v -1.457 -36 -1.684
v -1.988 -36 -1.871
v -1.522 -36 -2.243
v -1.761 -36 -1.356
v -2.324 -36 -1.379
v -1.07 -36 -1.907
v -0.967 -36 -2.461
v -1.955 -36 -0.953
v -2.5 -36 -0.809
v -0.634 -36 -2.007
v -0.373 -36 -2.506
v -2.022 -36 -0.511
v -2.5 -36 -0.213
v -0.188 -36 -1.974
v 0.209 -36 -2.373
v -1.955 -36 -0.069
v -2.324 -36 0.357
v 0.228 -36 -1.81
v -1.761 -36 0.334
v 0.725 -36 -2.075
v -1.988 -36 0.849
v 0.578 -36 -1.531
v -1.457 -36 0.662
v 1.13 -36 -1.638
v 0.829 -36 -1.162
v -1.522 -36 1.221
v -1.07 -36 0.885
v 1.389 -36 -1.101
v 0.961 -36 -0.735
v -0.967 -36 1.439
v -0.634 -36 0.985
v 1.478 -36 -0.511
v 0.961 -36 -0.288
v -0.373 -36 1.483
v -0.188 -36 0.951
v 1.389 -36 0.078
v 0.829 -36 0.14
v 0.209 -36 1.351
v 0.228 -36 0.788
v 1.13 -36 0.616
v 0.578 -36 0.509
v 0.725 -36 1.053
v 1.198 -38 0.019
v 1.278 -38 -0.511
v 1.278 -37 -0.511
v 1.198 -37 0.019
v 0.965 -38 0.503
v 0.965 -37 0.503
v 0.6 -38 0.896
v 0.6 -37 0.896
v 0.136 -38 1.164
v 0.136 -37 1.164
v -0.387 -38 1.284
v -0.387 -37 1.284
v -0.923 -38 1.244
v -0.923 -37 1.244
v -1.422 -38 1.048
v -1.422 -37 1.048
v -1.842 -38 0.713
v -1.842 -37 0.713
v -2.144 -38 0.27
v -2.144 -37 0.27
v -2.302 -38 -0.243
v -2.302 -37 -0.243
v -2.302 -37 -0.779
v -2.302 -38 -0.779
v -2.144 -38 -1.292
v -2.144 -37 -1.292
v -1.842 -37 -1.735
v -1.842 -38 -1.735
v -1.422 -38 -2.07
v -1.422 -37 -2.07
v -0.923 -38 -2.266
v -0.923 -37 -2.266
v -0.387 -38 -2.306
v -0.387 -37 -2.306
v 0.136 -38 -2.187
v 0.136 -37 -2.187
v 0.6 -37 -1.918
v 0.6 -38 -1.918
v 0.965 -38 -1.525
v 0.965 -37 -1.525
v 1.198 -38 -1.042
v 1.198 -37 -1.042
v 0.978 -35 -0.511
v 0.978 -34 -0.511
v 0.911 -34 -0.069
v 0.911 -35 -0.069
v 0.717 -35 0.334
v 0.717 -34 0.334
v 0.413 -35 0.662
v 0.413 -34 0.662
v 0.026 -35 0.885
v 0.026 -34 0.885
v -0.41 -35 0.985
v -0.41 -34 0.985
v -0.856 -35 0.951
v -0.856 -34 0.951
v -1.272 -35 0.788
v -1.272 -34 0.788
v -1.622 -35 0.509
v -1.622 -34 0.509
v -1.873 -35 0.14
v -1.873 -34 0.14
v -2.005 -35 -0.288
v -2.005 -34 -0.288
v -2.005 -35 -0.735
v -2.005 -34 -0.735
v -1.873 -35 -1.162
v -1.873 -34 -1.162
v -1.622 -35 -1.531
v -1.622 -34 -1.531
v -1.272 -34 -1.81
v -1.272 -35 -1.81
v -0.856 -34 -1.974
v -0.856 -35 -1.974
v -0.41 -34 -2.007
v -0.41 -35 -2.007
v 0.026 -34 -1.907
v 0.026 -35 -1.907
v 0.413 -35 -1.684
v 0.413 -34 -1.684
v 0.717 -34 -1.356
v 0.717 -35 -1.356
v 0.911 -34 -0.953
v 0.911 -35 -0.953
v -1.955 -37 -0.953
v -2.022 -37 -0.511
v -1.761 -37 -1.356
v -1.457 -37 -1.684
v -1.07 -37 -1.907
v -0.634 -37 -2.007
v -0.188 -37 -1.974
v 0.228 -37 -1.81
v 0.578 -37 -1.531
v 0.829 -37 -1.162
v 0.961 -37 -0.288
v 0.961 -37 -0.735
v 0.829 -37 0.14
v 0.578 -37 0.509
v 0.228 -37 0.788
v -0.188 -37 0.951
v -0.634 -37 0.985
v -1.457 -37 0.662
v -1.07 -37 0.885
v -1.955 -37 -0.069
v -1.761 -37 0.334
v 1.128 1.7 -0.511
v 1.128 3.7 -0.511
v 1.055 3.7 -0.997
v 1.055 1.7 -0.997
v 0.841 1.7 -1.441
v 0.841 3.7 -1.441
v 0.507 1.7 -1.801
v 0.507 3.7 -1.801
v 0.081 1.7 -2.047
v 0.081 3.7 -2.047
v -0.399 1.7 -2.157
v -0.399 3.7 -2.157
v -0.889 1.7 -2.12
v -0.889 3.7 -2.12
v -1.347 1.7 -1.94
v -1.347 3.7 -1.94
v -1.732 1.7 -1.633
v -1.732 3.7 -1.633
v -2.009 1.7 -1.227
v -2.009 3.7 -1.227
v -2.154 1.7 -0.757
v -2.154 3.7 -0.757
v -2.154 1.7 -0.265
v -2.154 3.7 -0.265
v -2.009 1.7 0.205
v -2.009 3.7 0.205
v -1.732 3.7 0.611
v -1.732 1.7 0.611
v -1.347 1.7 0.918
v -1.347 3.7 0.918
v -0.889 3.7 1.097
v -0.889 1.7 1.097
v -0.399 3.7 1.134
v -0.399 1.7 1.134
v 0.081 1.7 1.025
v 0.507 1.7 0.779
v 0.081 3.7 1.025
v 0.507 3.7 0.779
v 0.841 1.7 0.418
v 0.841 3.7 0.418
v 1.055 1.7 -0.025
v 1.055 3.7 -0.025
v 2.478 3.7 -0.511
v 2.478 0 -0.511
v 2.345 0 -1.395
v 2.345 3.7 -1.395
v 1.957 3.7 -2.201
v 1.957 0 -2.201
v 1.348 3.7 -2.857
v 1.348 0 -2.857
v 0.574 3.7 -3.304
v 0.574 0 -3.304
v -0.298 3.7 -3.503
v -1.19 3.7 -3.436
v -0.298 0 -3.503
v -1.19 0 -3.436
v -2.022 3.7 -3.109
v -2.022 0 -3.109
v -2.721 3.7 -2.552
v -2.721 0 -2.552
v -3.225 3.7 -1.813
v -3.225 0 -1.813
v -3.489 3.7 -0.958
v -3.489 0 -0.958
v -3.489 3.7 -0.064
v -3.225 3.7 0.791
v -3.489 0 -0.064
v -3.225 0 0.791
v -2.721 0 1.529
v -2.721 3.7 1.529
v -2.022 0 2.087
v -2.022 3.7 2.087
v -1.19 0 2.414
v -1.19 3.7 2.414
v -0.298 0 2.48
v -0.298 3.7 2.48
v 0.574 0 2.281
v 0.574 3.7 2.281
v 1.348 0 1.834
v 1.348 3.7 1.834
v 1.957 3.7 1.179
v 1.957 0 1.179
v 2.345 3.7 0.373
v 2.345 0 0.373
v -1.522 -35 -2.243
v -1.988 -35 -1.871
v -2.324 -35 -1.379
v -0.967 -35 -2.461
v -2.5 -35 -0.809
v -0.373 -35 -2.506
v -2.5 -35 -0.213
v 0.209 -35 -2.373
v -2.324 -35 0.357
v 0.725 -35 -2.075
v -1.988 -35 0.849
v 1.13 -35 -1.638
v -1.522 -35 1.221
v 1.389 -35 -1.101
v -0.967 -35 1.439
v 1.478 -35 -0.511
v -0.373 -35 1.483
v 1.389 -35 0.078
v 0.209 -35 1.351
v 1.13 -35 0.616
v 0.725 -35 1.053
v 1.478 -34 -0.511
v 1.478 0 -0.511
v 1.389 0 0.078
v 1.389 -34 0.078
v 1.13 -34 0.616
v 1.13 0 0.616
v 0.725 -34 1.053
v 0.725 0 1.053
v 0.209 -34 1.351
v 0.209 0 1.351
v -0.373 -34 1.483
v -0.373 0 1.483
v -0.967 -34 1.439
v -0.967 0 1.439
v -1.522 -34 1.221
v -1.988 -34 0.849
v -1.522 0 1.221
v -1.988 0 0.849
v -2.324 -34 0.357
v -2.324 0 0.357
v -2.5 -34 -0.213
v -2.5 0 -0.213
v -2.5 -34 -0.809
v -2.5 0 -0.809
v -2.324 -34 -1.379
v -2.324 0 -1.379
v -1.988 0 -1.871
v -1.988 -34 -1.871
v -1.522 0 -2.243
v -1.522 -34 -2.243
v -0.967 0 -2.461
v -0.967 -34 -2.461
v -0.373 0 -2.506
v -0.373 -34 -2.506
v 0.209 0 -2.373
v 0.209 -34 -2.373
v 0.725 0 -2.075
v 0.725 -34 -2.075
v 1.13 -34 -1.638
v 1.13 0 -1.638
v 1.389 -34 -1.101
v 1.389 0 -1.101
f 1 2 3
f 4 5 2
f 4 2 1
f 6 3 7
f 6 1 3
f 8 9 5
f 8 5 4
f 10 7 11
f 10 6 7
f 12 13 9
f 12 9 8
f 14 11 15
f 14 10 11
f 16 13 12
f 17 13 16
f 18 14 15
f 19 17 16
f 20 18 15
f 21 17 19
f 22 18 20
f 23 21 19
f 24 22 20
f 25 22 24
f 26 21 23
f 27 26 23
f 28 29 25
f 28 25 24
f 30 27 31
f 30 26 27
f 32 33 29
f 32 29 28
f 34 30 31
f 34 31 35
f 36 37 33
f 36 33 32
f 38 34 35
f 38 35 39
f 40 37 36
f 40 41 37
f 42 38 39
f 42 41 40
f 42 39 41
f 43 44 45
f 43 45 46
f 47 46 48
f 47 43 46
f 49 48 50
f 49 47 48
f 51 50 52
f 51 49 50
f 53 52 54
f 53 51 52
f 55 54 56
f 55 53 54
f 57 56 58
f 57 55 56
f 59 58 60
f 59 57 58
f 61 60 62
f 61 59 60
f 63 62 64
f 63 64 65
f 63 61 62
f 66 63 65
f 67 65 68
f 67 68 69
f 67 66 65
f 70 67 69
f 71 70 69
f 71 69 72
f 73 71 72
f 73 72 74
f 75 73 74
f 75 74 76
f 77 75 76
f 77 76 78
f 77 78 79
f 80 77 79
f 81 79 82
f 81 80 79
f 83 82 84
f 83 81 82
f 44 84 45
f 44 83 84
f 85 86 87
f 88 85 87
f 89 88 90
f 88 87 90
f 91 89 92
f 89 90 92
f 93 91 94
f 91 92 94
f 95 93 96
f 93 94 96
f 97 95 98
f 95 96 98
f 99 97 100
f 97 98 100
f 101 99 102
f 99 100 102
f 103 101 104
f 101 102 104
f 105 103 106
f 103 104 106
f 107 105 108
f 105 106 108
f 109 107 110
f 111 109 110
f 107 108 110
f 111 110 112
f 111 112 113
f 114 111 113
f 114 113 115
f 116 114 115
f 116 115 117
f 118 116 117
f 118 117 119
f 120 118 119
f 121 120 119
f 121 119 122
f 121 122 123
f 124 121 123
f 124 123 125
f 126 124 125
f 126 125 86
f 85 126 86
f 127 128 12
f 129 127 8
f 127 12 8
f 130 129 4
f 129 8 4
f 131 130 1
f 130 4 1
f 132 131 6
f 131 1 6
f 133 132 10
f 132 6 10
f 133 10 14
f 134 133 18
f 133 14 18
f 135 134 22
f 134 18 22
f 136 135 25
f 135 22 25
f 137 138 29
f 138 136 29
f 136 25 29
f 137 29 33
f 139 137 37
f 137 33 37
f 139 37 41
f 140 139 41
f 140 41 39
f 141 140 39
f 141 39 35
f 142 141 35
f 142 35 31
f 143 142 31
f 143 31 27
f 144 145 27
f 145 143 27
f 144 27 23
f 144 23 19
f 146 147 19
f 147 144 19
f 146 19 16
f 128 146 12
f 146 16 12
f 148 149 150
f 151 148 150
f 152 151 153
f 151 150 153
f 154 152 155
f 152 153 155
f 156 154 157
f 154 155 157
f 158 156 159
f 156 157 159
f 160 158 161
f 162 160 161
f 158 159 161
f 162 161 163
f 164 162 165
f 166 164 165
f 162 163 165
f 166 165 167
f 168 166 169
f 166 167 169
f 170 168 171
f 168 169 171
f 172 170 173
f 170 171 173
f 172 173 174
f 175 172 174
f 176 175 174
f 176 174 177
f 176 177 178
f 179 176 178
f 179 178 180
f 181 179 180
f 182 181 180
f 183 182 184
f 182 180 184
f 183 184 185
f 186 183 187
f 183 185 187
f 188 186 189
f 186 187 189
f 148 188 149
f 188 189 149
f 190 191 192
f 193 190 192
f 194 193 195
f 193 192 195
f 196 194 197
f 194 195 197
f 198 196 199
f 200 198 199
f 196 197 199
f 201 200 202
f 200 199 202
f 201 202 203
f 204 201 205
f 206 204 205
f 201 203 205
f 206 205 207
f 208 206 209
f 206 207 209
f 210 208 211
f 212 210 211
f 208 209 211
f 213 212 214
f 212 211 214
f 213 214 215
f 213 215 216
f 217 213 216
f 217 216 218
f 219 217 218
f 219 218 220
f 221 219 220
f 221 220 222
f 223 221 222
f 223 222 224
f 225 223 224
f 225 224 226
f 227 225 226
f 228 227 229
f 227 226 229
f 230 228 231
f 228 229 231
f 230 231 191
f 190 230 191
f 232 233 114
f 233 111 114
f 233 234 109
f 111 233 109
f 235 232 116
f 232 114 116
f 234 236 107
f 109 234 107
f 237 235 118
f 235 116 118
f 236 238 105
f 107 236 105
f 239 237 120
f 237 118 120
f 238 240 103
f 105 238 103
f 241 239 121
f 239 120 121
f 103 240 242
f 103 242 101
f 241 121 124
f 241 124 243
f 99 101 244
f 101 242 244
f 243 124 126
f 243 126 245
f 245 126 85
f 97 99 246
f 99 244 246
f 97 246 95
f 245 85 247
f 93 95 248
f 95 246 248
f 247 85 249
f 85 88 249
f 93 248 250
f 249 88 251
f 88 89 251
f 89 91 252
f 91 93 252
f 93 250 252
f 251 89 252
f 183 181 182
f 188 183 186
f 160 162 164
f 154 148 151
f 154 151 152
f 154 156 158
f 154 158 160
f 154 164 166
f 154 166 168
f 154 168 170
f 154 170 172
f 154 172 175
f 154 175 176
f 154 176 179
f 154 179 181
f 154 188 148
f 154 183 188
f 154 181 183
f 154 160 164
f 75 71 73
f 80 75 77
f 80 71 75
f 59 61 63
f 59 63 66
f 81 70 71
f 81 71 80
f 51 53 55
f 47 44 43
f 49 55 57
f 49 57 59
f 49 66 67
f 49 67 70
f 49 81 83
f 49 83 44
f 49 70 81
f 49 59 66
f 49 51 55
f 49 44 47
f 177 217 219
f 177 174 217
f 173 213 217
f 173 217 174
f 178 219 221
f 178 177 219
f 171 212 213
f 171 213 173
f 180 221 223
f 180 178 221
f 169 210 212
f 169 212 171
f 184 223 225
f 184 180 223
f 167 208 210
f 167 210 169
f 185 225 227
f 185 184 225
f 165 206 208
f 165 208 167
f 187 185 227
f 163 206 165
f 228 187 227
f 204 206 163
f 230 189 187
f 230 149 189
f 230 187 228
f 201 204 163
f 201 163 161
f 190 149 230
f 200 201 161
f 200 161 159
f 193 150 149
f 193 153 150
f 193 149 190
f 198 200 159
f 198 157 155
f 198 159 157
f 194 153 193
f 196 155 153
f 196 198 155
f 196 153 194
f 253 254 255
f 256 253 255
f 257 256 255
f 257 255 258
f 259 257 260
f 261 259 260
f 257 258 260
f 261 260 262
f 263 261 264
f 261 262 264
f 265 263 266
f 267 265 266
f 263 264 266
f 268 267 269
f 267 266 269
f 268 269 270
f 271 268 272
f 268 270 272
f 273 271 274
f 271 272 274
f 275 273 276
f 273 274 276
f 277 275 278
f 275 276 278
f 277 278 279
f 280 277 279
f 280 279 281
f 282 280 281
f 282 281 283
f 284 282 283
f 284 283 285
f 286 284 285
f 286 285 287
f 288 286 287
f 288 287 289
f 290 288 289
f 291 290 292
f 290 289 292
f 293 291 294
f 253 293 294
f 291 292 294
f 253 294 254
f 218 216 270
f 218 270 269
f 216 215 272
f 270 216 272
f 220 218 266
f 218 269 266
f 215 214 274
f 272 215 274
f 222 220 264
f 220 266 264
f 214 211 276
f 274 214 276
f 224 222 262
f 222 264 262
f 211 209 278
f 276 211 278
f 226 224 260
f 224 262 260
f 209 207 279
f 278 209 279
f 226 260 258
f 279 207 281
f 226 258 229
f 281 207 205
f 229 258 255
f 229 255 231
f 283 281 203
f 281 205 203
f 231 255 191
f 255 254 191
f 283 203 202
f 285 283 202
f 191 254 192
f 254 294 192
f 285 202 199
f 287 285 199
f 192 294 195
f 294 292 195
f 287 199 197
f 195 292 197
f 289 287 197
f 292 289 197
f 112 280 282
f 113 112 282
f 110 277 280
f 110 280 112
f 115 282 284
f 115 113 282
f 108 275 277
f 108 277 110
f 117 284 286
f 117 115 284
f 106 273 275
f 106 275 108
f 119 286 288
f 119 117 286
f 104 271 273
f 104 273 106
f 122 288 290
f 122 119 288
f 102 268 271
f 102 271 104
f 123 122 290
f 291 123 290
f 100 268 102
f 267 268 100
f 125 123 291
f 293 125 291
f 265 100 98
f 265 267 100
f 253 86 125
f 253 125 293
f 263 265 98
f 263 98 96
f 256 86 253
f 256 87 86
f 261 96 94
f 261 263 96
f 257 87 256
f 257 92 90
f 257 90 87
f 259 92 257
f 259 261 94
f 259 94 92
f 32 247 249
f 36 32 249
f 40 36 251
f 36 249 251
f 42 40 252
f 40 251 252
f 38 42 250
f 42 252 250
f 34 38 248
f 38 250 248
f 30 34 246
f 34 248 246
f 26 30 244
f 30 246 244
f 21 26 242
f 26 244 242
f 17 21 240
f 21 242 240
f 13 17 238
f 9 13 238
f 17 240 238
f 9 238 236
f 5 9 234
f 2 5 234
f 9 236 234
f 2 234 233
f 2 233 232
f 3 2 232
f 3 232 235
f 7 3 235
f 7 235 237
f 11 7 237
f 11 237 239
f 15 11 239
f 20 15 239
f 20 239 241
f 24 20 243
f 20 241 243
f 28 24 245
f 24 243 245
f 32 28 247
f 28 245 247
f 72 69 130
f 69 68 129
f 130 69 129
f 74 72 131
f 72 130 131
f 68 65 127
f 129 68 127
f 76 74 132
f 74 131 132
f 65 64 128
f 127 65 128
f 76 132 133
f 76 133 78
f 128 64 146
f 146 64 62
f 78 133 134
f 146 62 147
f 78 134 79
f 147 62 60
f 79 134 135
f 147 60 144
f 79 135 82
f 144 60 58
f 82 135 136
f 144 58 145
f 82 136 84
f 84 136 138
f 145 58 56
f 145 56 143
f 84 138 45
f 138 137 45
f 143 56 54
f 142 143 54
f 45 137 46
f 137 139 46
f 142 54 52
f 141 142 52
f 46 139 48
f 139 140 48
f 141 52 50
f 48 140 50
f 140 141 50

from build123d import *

# Parameters (mm, degrees)
SKETCH1_R           = 3
BOSS_EXTRUDE1_DEPTH = 3.7
SKETCH1_3_R         = 1.6
BOSS_EXTRUDE2_DEPTH = 1
SKETCH5_R           = 1.5
BOSS_EXTRUDE3_DEPTH = 35
SKETCH6_R           = 2
BOSS_EXTRUDE4_DEPTH = 1
SKETCH8_R           = 1.5
BOSS_EXTRUDE5_DEPTH = 2
SKETCH10_R          = 1.8
BOSS_EXTRUDE6_DEPTH = 1
SKETCH12_R          = 1.65
CUT_EXTRUDE1_DEPTH  = 2
SKETCH13_R          = 2
BOSS_EXTRUDE7_DEPTH = 34


with BuildPart() as part:
    # Sketch1 → Boss-Extrude1 (new body)
    with BuildSketch(Plane(origin=(0, 0, 0), x_dir=(1, 0, 0), z_dir=(0, 1, 0))):
        with Locations((-0.522013312, 0.511138034)):
            Circle(SKETCH1_R)
    extrude(amount=BOSS_EXTRUDE1_DEPTH)

    # Sketch1<3> → Boss-Extrude2 (add)
    with BuildSketch(Plane(origin=(0, 0, 0), x_dir=(1, 0, 0), z_dir=(0, 1, 0))):
        with Locations((-0.522013312, 0.511138034)):
            Circle(SKETCH1_3_R)
    extrude(amount=BOSS_EXTRUDE2_DEPTH)

    # Sketch5 → Boss-Extrude3 (add)
    with BuildSketch(Plane.XZ):
        with Locations((-0.522013312, -0.511138034)):
            Circle(SKETCH5_R)
    extrude(amount=BOSS_EXTRUDE3_DEPTH)

    # Sketch6 → Boss-Extrude4 (add)
    with BuildSketch(Plane.XZ.offset(35)):
        with Locations((-0.522013312, -0.511138034)):
            Circle(SKETCH6_R)
    extrude(amount=BOSS_EXTRUDE4_DEPTH)

    # Sketch8 → Boss-Extrude5 (add)
    with BuildSketch(Plane(origin=(0, -36, 0), x_dir=(-1, 0, 0), z_dir=(0, -1, 0))):
        with Locations((0.522013312, 0.511138034)):
            Circle(SKETCH8_R)
    extrude(amount=BOSS_EXTRUDE5_DEPTH)

    # Sketch10 → Boss-Extrude6 (add)
    with BuildSketch(Plane.XZ.offset(38)):
        with Locations((-0.522013312, -0.511138034)):
            Circle(SKETCH10_R)
    extrude(amount=-BOSS_EXTRUDE6_DEPTH)

    # Sketch12 → Cut-Extrude1 (cut)
    with BuildSketch(Plane(origin=(0, 3.7, 0), x_dir=(1, 0, 0), z_dir=(0, 1, 0))):
        with Locations((-0.522013312, 0.511138034)):
            Circle(SKETCH12_R)
    extrude(amount=-CUT_EXTRUDE1_DEPTH, mode=Mode.SUBTRACT)

    # Sketch13 → Boss-Extrude7 (add)
    with BuildSketch(Plane.XZ):
        with Locations((-0.522013312, -0.511138034)):
            Circle(SKETCH13_R)
    extrude(amount=BOSS_EXTRUDE7_DEPTH)


solid = part.part
